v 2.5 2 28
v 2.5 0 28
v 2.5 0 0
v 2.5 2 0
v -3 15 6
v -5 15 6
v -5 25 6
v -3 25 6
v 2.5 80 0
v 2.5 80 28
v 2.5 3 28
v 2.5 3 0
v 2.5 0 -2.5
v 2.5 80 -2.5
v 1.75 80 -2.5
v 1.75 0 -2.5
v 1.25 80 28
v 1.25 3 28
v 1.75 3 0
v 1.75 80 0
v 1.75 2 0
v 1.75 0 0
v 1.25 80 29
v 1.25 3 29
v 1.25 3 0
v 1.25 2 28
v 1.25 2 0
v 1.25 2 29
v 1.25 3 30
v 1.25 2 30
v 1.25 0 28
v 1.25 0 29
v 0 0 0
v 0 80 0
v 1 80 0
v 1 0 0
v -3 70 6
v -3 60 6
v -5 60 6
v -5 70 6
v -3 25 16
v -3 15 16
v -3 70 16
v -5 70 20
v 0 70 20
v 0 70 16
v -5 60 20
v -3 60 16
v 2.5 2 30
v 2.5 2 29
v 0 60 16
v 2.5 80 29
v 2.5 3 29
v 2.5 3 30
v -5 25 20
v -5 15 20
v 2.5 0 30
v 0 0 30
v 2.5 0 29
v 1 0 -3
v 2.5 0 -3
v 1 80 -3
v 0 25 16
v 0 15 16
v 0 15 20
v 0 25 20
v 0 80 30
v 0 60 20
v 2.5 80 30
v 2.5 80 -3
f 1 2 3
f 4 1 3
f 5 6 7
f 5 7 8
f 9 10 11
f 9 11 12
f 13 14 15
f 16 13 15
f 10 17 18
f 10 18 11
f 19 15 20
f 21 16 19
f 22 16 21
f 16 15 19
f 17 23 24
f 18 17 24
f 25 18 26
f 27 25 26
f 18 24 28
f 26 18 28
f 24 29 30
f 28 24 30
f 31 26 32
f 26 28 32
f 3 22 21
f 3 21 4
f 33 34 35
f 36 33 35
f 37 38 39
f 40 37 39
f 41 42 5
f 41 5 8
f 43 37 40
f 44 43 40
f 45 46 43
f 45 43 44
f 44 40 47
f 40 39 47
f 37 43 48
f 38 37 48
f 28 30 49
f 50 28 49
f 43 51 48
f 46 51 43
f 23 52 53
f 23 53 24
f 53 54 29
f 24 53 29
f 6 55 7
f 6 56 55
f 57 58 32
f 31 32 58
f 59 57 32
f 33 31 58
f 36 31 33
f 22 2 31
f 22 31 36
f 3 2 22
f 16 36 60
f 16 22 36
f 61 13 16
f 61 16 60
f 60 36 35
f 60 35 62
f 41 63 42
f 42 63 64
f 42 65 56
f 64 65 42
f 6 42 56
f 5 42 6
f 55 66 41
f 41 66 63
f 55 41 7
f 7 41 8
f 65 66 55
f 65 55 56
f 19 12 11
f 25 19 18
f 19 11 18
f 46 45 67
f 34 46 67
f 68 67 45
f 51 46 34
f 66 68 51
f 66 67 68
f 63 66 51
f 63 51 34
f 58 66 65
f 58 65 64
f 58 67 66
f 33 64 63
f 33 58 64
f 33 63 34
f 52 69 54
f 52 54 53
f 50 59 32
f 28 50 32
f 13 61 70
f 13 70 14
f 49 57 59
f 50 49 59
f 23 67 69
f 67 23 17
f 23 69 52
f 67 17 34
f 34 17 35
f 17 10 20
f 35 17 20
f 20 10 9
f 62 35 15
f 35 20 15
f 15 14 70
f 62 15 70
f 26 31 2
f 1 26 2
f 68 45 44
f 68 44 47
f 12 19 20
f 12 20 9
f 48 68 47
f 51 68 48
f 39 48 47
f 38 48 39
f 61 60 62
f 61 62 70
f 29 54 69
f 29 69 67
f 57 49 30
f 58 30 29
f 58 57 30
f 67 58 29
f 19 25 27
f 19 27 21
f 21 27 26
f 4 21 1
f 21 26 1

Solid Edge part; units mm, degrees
sketch "Sketch1" plane through (0, 0, 0) normal (0, -1, 0) x (1, 0, 0)
  line L0 (0, 30) -> (0, 0)
  line L1 (0, 0) -> (2.5, 0)
  line L2 (2.5, 28) -> (2.5, 0)
  line L3 (1.25, 28) -> (2.5, 28)
  line L4 (1.25, 29) -> (1.25, 28)
  line L5 (2.5, 29) -> (1.25, 29)
  line L6 (2.5, 30) -> (2.5, 29)
  line L7 (2.5, 30) -> (0, 30)
extrude "Protrusion1" add sketch "Sketch1" against normal blind 80
sketch "Sketch2" plane through (0, 0, 0) normal (0, -1, 0) x (1, 0, 0)
  line L0 (1.75, -2.5) -> (1.75, 0)
  line L1 (1, 0) -> (1.75, 0)
  line L2 (1, 0) -> (1, -3)
  line L3 (1, -3) -> (2.5, -3)
  line L4 (2.5, -3) -> (2.5, -2.5)
  line L5 (2.5, -2.5) -> (1.75, -2.5)
extrude "Vysunutí_2" add sketch "Sketch2" against normal blind 80
sketch "Sketch3" plane through (1.25, 40, 30) normal (0, 0, 1) x (0, 1, 0)
  line L0 (-37, 0) -> (-38, 0)
  line L1 (-38, 0) -> (-38, -1.25)
  line L2 (-38, -1.25) -> (-37, -1.25)
  line L3 (-37, -1.25) -> (-37, 0)
extrude "Cutout1" cut sketch "Sketch3" against normal blind 30
sketch "Sketch4" plane through (0, 40, 15) normal (-1, 0, 0) x (0, -1, 0)
  line L0 (-20, 5) -> (-20, 1)
  line L1 (-20, 1) -> (-30, 1)
  line L2 (-30, 1) -> (-30, 5)
  line L3 (-30, 5) -> (-20, 5)
  line L4 (15, 5) -> (15, 1)
  line L5 (15, 1) -> (20, 1)
  line L6 (25, 1) -> (20, 1)
  line L7 (25, 5) -> (25, 1)
  line L8 (20, 5) -> (25, 5)
  line L9 (20, 5) -> (15, 5)
extrude "Protrusion2" add sketch "Sketch4" along normal blind 5
sketch "Sketch5" plane through (-2.5, 20, 16) normal (0, 0, -1) x (1, 0, 0)
  line L0 (-2.5, -5) -> (-2.5, 5)
  line L1 (-2.5, 5) -> (-0.5, 5)
  line L2 (-0.5, 5) -> (-0.5, -5)
  line L3 (-0.5, -5) -> (-2.5, -5)
  line L4 (-0.5, -50) -> (-0.5, -40)
  line L5 (-0.5, -40) -> (-2.5, -40)
  line L6 (-2.5, -40) -> (-2.5, -50)
  line L7 (-2.5, -50) -> (-0.5, -50)
extrude "Vysunutí_4" add sketch "Sketch5" along normal blind 10
